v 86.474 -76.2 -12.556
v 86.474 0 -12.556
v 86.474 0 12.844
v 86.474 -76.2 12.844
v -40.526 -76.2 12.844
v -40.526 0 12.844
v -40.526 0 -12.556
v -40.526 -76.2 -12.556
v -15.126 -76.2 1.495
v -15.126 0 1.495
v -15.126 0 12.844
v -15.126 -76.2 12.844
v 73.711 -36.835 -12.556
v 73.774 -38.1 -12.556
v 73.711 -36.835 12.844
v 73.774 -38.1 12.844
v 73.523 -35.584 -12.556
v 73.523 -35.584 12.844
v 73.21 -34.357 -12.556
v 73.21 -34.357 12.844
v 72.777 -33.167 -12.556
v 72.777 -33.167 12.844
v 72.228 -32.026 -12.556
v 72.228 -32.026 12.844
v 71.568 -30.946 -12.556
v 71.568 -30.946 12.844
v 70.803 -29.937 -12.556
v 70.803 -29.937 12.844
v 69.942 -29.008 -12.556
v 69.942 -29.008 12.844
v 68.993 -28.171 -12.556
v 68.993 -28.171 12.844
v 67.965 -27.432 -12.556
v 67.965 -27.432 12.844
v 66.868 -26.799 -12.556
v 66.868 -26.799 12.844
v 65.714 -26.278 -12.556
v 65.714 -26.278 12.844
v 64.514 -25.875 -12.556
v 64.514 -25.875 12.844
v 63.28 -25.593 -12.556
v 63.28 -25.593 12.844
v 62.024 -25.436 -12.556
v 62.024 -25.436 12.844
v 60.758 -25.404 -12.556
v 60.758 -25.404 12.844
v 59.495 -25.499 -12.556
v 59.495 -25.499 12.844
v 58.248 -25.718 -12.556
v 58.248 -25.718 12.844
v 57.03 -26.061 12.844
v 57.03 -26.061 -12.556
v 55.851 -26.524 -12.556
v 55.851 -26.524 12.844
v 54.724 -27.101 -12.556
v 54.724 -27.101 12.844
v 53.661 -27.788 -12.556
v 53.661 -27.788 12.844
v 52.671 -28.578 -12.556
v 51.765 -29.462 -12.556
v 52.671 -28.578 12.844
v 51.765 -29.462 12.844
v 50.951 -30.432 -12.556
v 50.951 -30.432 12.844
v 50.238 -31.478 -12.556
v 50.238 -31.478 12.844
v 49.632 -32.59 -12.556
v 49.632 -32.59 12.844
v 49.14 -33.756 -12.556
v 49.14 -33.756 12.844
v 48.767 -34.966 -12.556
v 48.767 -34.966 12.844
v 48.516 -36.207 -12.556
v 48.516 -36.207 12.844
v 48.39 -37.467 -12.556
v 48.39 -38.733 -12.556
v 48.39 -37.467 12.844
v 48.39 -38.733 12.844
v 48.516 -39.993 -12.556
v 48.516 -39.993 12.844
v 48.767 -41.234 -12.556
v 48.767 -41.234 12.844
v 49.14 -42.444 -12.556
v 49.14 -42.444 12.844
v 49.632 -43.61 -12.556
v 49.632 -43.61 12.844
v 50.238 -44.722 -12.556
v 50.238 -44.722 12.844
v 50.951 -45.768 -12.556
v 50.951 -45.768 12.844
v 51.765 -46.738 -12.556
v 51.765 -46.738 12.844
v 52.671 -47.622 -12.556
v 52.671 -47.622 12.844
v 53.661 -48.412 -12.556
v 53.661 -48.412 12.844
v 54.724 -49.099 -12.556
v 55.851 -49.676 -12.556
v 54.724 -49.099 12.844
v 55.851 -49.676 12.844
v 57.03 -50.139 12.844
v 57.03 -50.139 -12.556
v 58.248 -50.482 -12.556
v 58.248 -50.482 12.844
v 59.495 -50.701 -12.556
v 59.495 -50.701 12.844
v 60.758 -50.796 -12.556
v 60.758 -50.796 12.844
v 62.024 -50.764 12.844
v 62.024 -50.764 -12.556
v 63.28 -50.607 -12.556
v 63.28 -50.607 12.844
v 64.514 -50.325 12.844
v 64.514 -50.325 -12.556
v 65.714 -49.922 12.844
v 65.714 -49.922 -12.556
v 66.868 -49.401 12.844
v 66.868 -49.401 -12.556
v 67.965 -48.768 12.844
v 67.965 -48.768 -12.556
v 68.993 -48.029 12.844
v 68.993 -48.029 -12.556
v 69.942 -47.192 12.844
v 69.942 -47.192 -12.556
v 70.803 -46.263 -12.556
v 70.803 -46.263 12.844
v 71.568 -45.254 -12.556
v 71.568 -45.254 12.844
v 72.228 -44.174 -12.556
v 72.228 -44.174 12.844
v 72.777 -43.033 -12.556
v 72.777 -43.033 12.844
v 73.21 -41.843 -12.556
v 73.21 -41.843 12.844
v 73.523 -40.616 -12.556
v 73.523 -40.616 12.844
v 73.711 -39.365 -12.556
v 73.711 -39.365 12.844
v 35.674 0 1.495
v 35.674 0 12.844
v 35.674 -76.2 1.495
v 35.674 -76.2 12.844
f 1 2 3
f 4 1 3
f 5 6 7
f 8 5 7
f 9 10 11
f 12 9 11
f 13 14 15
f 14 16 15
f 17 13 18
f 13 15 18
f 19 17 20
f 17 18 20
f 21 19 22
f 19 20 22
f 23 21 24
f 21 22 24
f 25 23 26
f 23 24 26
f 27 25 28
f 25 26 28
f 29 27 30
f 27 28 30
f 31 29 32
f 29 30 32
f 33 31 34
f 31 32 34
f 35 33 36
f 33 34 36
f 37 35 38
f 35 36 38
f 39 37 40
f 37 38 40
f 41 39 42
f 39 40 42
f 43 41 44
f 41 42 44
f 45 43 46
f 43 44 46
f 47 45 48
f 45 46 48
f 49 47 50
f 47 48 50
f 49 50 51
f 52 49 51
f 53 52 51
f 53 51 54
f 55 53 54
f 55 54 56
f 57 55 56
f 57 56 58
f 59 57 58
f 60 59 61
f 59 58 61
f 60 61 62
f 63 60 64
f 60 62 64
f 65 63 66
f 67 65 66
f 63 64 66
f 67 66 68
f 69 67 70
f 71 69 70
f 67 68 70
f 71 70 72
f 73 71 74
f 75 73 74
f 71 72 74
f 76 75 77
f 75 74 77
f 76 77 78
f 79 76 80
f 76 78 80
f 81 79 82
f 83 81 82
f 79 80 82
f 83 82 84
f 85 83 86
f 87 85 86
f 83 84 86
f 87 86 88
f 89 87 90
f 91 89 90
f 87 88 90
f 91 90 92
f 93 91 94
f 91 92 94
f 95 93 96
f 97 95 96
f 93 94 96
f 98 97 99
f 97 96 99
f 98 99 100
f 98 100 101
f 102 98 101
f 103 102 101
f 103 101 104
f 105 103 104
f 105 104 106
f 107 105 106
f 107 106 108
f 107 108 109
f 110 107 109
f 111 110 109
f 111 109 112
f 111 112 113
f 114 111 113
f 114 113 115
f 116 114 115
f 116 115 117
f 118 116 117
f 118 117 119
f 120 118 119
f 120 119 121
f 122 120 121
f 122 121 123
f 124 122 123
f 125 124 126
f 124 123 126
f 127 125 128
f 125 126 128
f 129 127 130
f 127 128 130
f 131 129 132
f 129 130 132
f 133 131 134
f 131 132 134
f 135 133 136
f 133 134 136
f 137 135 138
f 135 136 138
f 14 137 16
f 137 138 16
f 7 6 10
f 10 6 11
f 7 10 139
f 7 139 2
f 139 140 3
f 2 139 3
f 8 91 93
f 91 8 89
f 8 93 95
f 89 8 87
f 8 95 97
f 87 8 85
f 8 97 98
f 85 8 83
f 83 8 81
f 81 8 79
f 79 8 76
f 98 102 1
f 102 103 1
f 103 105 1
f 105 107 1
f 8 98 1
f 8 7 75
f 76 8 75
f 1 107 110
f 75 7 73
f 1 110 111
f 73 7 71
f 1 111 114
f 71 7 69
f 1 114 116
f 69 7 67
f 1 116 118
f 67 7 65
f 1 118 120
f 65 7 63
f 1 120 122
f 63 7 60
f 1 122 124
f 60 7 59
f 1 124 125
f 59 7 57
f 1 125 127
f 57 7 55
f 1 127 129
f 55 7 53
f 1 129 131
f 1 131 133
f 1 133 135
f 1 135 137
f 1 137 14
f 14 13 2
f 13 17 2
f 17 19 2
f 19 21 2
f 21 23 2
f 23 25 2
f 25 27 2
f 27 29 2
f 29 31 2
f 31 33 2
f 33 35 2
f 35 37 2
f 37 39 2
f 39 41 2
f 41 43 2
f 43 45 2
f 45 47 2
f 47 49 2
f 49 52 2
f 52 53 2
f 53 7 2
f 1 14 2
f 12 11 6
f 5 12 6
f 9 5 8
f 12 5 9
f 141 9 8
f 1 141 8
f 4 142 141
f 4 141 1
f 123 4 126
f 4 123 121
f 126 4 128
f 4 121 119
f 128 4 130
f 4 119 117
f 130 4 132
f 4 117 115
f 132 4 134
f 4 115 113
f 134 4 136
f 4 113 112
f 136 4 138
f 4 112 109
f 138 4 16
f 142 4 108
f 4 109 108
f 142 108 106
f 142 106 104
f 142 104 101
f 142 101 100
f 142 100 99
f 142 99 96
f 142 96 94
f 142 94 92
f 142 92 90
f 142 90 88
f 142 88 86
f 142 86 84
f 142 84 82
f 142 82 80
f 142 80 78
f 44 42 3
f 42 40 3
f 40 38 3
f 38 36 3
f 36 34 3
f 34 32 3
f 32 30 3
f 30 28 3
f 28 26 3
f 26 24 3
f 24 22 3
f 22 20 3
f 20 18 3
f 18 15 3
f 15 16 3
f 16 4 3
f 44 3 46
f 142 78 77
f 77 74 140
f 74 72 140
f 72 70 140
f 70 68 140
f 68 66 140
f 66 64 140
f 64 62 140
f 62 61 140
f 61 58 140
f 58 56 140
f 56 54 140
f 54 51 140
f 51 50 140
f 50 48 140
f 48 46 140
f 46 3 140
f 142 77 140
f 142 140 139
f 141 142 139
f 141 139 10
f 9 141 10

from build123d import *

# Parameters (mm, degrees)
F1_DEPTH = 76.2
F2_R     = 12.7
F3_DEPTH = 50.8
F4_DEPTH = 50.8


with BuildPart() as f1:
    # F0 (on Front) → F1 (new body)
    with BuildSketch(Plane.XZ):
        Polygon((-15.125556, 12.843926), (-40.525556, 12.843926), (-40.525556, -12.556074), (86.474444, -12.556074), (86.474444, 12.843926), (35.674444, 12.843926), (35.674444, 1.494974), (-15.125556, 1.494974), align=None)
    extrude(amount=F1_DEPTH)

    # F2 (on Top) → F3 (cut)
    with BuildSketch(Plane.XY):
        with Locations((61.074444, -38.1)):
            Circle(F2_R)
    extrude(amount=F3_DEPTH, mode=Mode.SUBTRACT)

    # F2 (on Top) → F4 (cut)
    with BuildSketch(Plane.XY):
        with Locations((61.074444, -38.1)):
            Circle(F2_R)
    extrude(amount=-F4_DEPTH, mode=Mode.SUBTRACT)


solid = f1.part
